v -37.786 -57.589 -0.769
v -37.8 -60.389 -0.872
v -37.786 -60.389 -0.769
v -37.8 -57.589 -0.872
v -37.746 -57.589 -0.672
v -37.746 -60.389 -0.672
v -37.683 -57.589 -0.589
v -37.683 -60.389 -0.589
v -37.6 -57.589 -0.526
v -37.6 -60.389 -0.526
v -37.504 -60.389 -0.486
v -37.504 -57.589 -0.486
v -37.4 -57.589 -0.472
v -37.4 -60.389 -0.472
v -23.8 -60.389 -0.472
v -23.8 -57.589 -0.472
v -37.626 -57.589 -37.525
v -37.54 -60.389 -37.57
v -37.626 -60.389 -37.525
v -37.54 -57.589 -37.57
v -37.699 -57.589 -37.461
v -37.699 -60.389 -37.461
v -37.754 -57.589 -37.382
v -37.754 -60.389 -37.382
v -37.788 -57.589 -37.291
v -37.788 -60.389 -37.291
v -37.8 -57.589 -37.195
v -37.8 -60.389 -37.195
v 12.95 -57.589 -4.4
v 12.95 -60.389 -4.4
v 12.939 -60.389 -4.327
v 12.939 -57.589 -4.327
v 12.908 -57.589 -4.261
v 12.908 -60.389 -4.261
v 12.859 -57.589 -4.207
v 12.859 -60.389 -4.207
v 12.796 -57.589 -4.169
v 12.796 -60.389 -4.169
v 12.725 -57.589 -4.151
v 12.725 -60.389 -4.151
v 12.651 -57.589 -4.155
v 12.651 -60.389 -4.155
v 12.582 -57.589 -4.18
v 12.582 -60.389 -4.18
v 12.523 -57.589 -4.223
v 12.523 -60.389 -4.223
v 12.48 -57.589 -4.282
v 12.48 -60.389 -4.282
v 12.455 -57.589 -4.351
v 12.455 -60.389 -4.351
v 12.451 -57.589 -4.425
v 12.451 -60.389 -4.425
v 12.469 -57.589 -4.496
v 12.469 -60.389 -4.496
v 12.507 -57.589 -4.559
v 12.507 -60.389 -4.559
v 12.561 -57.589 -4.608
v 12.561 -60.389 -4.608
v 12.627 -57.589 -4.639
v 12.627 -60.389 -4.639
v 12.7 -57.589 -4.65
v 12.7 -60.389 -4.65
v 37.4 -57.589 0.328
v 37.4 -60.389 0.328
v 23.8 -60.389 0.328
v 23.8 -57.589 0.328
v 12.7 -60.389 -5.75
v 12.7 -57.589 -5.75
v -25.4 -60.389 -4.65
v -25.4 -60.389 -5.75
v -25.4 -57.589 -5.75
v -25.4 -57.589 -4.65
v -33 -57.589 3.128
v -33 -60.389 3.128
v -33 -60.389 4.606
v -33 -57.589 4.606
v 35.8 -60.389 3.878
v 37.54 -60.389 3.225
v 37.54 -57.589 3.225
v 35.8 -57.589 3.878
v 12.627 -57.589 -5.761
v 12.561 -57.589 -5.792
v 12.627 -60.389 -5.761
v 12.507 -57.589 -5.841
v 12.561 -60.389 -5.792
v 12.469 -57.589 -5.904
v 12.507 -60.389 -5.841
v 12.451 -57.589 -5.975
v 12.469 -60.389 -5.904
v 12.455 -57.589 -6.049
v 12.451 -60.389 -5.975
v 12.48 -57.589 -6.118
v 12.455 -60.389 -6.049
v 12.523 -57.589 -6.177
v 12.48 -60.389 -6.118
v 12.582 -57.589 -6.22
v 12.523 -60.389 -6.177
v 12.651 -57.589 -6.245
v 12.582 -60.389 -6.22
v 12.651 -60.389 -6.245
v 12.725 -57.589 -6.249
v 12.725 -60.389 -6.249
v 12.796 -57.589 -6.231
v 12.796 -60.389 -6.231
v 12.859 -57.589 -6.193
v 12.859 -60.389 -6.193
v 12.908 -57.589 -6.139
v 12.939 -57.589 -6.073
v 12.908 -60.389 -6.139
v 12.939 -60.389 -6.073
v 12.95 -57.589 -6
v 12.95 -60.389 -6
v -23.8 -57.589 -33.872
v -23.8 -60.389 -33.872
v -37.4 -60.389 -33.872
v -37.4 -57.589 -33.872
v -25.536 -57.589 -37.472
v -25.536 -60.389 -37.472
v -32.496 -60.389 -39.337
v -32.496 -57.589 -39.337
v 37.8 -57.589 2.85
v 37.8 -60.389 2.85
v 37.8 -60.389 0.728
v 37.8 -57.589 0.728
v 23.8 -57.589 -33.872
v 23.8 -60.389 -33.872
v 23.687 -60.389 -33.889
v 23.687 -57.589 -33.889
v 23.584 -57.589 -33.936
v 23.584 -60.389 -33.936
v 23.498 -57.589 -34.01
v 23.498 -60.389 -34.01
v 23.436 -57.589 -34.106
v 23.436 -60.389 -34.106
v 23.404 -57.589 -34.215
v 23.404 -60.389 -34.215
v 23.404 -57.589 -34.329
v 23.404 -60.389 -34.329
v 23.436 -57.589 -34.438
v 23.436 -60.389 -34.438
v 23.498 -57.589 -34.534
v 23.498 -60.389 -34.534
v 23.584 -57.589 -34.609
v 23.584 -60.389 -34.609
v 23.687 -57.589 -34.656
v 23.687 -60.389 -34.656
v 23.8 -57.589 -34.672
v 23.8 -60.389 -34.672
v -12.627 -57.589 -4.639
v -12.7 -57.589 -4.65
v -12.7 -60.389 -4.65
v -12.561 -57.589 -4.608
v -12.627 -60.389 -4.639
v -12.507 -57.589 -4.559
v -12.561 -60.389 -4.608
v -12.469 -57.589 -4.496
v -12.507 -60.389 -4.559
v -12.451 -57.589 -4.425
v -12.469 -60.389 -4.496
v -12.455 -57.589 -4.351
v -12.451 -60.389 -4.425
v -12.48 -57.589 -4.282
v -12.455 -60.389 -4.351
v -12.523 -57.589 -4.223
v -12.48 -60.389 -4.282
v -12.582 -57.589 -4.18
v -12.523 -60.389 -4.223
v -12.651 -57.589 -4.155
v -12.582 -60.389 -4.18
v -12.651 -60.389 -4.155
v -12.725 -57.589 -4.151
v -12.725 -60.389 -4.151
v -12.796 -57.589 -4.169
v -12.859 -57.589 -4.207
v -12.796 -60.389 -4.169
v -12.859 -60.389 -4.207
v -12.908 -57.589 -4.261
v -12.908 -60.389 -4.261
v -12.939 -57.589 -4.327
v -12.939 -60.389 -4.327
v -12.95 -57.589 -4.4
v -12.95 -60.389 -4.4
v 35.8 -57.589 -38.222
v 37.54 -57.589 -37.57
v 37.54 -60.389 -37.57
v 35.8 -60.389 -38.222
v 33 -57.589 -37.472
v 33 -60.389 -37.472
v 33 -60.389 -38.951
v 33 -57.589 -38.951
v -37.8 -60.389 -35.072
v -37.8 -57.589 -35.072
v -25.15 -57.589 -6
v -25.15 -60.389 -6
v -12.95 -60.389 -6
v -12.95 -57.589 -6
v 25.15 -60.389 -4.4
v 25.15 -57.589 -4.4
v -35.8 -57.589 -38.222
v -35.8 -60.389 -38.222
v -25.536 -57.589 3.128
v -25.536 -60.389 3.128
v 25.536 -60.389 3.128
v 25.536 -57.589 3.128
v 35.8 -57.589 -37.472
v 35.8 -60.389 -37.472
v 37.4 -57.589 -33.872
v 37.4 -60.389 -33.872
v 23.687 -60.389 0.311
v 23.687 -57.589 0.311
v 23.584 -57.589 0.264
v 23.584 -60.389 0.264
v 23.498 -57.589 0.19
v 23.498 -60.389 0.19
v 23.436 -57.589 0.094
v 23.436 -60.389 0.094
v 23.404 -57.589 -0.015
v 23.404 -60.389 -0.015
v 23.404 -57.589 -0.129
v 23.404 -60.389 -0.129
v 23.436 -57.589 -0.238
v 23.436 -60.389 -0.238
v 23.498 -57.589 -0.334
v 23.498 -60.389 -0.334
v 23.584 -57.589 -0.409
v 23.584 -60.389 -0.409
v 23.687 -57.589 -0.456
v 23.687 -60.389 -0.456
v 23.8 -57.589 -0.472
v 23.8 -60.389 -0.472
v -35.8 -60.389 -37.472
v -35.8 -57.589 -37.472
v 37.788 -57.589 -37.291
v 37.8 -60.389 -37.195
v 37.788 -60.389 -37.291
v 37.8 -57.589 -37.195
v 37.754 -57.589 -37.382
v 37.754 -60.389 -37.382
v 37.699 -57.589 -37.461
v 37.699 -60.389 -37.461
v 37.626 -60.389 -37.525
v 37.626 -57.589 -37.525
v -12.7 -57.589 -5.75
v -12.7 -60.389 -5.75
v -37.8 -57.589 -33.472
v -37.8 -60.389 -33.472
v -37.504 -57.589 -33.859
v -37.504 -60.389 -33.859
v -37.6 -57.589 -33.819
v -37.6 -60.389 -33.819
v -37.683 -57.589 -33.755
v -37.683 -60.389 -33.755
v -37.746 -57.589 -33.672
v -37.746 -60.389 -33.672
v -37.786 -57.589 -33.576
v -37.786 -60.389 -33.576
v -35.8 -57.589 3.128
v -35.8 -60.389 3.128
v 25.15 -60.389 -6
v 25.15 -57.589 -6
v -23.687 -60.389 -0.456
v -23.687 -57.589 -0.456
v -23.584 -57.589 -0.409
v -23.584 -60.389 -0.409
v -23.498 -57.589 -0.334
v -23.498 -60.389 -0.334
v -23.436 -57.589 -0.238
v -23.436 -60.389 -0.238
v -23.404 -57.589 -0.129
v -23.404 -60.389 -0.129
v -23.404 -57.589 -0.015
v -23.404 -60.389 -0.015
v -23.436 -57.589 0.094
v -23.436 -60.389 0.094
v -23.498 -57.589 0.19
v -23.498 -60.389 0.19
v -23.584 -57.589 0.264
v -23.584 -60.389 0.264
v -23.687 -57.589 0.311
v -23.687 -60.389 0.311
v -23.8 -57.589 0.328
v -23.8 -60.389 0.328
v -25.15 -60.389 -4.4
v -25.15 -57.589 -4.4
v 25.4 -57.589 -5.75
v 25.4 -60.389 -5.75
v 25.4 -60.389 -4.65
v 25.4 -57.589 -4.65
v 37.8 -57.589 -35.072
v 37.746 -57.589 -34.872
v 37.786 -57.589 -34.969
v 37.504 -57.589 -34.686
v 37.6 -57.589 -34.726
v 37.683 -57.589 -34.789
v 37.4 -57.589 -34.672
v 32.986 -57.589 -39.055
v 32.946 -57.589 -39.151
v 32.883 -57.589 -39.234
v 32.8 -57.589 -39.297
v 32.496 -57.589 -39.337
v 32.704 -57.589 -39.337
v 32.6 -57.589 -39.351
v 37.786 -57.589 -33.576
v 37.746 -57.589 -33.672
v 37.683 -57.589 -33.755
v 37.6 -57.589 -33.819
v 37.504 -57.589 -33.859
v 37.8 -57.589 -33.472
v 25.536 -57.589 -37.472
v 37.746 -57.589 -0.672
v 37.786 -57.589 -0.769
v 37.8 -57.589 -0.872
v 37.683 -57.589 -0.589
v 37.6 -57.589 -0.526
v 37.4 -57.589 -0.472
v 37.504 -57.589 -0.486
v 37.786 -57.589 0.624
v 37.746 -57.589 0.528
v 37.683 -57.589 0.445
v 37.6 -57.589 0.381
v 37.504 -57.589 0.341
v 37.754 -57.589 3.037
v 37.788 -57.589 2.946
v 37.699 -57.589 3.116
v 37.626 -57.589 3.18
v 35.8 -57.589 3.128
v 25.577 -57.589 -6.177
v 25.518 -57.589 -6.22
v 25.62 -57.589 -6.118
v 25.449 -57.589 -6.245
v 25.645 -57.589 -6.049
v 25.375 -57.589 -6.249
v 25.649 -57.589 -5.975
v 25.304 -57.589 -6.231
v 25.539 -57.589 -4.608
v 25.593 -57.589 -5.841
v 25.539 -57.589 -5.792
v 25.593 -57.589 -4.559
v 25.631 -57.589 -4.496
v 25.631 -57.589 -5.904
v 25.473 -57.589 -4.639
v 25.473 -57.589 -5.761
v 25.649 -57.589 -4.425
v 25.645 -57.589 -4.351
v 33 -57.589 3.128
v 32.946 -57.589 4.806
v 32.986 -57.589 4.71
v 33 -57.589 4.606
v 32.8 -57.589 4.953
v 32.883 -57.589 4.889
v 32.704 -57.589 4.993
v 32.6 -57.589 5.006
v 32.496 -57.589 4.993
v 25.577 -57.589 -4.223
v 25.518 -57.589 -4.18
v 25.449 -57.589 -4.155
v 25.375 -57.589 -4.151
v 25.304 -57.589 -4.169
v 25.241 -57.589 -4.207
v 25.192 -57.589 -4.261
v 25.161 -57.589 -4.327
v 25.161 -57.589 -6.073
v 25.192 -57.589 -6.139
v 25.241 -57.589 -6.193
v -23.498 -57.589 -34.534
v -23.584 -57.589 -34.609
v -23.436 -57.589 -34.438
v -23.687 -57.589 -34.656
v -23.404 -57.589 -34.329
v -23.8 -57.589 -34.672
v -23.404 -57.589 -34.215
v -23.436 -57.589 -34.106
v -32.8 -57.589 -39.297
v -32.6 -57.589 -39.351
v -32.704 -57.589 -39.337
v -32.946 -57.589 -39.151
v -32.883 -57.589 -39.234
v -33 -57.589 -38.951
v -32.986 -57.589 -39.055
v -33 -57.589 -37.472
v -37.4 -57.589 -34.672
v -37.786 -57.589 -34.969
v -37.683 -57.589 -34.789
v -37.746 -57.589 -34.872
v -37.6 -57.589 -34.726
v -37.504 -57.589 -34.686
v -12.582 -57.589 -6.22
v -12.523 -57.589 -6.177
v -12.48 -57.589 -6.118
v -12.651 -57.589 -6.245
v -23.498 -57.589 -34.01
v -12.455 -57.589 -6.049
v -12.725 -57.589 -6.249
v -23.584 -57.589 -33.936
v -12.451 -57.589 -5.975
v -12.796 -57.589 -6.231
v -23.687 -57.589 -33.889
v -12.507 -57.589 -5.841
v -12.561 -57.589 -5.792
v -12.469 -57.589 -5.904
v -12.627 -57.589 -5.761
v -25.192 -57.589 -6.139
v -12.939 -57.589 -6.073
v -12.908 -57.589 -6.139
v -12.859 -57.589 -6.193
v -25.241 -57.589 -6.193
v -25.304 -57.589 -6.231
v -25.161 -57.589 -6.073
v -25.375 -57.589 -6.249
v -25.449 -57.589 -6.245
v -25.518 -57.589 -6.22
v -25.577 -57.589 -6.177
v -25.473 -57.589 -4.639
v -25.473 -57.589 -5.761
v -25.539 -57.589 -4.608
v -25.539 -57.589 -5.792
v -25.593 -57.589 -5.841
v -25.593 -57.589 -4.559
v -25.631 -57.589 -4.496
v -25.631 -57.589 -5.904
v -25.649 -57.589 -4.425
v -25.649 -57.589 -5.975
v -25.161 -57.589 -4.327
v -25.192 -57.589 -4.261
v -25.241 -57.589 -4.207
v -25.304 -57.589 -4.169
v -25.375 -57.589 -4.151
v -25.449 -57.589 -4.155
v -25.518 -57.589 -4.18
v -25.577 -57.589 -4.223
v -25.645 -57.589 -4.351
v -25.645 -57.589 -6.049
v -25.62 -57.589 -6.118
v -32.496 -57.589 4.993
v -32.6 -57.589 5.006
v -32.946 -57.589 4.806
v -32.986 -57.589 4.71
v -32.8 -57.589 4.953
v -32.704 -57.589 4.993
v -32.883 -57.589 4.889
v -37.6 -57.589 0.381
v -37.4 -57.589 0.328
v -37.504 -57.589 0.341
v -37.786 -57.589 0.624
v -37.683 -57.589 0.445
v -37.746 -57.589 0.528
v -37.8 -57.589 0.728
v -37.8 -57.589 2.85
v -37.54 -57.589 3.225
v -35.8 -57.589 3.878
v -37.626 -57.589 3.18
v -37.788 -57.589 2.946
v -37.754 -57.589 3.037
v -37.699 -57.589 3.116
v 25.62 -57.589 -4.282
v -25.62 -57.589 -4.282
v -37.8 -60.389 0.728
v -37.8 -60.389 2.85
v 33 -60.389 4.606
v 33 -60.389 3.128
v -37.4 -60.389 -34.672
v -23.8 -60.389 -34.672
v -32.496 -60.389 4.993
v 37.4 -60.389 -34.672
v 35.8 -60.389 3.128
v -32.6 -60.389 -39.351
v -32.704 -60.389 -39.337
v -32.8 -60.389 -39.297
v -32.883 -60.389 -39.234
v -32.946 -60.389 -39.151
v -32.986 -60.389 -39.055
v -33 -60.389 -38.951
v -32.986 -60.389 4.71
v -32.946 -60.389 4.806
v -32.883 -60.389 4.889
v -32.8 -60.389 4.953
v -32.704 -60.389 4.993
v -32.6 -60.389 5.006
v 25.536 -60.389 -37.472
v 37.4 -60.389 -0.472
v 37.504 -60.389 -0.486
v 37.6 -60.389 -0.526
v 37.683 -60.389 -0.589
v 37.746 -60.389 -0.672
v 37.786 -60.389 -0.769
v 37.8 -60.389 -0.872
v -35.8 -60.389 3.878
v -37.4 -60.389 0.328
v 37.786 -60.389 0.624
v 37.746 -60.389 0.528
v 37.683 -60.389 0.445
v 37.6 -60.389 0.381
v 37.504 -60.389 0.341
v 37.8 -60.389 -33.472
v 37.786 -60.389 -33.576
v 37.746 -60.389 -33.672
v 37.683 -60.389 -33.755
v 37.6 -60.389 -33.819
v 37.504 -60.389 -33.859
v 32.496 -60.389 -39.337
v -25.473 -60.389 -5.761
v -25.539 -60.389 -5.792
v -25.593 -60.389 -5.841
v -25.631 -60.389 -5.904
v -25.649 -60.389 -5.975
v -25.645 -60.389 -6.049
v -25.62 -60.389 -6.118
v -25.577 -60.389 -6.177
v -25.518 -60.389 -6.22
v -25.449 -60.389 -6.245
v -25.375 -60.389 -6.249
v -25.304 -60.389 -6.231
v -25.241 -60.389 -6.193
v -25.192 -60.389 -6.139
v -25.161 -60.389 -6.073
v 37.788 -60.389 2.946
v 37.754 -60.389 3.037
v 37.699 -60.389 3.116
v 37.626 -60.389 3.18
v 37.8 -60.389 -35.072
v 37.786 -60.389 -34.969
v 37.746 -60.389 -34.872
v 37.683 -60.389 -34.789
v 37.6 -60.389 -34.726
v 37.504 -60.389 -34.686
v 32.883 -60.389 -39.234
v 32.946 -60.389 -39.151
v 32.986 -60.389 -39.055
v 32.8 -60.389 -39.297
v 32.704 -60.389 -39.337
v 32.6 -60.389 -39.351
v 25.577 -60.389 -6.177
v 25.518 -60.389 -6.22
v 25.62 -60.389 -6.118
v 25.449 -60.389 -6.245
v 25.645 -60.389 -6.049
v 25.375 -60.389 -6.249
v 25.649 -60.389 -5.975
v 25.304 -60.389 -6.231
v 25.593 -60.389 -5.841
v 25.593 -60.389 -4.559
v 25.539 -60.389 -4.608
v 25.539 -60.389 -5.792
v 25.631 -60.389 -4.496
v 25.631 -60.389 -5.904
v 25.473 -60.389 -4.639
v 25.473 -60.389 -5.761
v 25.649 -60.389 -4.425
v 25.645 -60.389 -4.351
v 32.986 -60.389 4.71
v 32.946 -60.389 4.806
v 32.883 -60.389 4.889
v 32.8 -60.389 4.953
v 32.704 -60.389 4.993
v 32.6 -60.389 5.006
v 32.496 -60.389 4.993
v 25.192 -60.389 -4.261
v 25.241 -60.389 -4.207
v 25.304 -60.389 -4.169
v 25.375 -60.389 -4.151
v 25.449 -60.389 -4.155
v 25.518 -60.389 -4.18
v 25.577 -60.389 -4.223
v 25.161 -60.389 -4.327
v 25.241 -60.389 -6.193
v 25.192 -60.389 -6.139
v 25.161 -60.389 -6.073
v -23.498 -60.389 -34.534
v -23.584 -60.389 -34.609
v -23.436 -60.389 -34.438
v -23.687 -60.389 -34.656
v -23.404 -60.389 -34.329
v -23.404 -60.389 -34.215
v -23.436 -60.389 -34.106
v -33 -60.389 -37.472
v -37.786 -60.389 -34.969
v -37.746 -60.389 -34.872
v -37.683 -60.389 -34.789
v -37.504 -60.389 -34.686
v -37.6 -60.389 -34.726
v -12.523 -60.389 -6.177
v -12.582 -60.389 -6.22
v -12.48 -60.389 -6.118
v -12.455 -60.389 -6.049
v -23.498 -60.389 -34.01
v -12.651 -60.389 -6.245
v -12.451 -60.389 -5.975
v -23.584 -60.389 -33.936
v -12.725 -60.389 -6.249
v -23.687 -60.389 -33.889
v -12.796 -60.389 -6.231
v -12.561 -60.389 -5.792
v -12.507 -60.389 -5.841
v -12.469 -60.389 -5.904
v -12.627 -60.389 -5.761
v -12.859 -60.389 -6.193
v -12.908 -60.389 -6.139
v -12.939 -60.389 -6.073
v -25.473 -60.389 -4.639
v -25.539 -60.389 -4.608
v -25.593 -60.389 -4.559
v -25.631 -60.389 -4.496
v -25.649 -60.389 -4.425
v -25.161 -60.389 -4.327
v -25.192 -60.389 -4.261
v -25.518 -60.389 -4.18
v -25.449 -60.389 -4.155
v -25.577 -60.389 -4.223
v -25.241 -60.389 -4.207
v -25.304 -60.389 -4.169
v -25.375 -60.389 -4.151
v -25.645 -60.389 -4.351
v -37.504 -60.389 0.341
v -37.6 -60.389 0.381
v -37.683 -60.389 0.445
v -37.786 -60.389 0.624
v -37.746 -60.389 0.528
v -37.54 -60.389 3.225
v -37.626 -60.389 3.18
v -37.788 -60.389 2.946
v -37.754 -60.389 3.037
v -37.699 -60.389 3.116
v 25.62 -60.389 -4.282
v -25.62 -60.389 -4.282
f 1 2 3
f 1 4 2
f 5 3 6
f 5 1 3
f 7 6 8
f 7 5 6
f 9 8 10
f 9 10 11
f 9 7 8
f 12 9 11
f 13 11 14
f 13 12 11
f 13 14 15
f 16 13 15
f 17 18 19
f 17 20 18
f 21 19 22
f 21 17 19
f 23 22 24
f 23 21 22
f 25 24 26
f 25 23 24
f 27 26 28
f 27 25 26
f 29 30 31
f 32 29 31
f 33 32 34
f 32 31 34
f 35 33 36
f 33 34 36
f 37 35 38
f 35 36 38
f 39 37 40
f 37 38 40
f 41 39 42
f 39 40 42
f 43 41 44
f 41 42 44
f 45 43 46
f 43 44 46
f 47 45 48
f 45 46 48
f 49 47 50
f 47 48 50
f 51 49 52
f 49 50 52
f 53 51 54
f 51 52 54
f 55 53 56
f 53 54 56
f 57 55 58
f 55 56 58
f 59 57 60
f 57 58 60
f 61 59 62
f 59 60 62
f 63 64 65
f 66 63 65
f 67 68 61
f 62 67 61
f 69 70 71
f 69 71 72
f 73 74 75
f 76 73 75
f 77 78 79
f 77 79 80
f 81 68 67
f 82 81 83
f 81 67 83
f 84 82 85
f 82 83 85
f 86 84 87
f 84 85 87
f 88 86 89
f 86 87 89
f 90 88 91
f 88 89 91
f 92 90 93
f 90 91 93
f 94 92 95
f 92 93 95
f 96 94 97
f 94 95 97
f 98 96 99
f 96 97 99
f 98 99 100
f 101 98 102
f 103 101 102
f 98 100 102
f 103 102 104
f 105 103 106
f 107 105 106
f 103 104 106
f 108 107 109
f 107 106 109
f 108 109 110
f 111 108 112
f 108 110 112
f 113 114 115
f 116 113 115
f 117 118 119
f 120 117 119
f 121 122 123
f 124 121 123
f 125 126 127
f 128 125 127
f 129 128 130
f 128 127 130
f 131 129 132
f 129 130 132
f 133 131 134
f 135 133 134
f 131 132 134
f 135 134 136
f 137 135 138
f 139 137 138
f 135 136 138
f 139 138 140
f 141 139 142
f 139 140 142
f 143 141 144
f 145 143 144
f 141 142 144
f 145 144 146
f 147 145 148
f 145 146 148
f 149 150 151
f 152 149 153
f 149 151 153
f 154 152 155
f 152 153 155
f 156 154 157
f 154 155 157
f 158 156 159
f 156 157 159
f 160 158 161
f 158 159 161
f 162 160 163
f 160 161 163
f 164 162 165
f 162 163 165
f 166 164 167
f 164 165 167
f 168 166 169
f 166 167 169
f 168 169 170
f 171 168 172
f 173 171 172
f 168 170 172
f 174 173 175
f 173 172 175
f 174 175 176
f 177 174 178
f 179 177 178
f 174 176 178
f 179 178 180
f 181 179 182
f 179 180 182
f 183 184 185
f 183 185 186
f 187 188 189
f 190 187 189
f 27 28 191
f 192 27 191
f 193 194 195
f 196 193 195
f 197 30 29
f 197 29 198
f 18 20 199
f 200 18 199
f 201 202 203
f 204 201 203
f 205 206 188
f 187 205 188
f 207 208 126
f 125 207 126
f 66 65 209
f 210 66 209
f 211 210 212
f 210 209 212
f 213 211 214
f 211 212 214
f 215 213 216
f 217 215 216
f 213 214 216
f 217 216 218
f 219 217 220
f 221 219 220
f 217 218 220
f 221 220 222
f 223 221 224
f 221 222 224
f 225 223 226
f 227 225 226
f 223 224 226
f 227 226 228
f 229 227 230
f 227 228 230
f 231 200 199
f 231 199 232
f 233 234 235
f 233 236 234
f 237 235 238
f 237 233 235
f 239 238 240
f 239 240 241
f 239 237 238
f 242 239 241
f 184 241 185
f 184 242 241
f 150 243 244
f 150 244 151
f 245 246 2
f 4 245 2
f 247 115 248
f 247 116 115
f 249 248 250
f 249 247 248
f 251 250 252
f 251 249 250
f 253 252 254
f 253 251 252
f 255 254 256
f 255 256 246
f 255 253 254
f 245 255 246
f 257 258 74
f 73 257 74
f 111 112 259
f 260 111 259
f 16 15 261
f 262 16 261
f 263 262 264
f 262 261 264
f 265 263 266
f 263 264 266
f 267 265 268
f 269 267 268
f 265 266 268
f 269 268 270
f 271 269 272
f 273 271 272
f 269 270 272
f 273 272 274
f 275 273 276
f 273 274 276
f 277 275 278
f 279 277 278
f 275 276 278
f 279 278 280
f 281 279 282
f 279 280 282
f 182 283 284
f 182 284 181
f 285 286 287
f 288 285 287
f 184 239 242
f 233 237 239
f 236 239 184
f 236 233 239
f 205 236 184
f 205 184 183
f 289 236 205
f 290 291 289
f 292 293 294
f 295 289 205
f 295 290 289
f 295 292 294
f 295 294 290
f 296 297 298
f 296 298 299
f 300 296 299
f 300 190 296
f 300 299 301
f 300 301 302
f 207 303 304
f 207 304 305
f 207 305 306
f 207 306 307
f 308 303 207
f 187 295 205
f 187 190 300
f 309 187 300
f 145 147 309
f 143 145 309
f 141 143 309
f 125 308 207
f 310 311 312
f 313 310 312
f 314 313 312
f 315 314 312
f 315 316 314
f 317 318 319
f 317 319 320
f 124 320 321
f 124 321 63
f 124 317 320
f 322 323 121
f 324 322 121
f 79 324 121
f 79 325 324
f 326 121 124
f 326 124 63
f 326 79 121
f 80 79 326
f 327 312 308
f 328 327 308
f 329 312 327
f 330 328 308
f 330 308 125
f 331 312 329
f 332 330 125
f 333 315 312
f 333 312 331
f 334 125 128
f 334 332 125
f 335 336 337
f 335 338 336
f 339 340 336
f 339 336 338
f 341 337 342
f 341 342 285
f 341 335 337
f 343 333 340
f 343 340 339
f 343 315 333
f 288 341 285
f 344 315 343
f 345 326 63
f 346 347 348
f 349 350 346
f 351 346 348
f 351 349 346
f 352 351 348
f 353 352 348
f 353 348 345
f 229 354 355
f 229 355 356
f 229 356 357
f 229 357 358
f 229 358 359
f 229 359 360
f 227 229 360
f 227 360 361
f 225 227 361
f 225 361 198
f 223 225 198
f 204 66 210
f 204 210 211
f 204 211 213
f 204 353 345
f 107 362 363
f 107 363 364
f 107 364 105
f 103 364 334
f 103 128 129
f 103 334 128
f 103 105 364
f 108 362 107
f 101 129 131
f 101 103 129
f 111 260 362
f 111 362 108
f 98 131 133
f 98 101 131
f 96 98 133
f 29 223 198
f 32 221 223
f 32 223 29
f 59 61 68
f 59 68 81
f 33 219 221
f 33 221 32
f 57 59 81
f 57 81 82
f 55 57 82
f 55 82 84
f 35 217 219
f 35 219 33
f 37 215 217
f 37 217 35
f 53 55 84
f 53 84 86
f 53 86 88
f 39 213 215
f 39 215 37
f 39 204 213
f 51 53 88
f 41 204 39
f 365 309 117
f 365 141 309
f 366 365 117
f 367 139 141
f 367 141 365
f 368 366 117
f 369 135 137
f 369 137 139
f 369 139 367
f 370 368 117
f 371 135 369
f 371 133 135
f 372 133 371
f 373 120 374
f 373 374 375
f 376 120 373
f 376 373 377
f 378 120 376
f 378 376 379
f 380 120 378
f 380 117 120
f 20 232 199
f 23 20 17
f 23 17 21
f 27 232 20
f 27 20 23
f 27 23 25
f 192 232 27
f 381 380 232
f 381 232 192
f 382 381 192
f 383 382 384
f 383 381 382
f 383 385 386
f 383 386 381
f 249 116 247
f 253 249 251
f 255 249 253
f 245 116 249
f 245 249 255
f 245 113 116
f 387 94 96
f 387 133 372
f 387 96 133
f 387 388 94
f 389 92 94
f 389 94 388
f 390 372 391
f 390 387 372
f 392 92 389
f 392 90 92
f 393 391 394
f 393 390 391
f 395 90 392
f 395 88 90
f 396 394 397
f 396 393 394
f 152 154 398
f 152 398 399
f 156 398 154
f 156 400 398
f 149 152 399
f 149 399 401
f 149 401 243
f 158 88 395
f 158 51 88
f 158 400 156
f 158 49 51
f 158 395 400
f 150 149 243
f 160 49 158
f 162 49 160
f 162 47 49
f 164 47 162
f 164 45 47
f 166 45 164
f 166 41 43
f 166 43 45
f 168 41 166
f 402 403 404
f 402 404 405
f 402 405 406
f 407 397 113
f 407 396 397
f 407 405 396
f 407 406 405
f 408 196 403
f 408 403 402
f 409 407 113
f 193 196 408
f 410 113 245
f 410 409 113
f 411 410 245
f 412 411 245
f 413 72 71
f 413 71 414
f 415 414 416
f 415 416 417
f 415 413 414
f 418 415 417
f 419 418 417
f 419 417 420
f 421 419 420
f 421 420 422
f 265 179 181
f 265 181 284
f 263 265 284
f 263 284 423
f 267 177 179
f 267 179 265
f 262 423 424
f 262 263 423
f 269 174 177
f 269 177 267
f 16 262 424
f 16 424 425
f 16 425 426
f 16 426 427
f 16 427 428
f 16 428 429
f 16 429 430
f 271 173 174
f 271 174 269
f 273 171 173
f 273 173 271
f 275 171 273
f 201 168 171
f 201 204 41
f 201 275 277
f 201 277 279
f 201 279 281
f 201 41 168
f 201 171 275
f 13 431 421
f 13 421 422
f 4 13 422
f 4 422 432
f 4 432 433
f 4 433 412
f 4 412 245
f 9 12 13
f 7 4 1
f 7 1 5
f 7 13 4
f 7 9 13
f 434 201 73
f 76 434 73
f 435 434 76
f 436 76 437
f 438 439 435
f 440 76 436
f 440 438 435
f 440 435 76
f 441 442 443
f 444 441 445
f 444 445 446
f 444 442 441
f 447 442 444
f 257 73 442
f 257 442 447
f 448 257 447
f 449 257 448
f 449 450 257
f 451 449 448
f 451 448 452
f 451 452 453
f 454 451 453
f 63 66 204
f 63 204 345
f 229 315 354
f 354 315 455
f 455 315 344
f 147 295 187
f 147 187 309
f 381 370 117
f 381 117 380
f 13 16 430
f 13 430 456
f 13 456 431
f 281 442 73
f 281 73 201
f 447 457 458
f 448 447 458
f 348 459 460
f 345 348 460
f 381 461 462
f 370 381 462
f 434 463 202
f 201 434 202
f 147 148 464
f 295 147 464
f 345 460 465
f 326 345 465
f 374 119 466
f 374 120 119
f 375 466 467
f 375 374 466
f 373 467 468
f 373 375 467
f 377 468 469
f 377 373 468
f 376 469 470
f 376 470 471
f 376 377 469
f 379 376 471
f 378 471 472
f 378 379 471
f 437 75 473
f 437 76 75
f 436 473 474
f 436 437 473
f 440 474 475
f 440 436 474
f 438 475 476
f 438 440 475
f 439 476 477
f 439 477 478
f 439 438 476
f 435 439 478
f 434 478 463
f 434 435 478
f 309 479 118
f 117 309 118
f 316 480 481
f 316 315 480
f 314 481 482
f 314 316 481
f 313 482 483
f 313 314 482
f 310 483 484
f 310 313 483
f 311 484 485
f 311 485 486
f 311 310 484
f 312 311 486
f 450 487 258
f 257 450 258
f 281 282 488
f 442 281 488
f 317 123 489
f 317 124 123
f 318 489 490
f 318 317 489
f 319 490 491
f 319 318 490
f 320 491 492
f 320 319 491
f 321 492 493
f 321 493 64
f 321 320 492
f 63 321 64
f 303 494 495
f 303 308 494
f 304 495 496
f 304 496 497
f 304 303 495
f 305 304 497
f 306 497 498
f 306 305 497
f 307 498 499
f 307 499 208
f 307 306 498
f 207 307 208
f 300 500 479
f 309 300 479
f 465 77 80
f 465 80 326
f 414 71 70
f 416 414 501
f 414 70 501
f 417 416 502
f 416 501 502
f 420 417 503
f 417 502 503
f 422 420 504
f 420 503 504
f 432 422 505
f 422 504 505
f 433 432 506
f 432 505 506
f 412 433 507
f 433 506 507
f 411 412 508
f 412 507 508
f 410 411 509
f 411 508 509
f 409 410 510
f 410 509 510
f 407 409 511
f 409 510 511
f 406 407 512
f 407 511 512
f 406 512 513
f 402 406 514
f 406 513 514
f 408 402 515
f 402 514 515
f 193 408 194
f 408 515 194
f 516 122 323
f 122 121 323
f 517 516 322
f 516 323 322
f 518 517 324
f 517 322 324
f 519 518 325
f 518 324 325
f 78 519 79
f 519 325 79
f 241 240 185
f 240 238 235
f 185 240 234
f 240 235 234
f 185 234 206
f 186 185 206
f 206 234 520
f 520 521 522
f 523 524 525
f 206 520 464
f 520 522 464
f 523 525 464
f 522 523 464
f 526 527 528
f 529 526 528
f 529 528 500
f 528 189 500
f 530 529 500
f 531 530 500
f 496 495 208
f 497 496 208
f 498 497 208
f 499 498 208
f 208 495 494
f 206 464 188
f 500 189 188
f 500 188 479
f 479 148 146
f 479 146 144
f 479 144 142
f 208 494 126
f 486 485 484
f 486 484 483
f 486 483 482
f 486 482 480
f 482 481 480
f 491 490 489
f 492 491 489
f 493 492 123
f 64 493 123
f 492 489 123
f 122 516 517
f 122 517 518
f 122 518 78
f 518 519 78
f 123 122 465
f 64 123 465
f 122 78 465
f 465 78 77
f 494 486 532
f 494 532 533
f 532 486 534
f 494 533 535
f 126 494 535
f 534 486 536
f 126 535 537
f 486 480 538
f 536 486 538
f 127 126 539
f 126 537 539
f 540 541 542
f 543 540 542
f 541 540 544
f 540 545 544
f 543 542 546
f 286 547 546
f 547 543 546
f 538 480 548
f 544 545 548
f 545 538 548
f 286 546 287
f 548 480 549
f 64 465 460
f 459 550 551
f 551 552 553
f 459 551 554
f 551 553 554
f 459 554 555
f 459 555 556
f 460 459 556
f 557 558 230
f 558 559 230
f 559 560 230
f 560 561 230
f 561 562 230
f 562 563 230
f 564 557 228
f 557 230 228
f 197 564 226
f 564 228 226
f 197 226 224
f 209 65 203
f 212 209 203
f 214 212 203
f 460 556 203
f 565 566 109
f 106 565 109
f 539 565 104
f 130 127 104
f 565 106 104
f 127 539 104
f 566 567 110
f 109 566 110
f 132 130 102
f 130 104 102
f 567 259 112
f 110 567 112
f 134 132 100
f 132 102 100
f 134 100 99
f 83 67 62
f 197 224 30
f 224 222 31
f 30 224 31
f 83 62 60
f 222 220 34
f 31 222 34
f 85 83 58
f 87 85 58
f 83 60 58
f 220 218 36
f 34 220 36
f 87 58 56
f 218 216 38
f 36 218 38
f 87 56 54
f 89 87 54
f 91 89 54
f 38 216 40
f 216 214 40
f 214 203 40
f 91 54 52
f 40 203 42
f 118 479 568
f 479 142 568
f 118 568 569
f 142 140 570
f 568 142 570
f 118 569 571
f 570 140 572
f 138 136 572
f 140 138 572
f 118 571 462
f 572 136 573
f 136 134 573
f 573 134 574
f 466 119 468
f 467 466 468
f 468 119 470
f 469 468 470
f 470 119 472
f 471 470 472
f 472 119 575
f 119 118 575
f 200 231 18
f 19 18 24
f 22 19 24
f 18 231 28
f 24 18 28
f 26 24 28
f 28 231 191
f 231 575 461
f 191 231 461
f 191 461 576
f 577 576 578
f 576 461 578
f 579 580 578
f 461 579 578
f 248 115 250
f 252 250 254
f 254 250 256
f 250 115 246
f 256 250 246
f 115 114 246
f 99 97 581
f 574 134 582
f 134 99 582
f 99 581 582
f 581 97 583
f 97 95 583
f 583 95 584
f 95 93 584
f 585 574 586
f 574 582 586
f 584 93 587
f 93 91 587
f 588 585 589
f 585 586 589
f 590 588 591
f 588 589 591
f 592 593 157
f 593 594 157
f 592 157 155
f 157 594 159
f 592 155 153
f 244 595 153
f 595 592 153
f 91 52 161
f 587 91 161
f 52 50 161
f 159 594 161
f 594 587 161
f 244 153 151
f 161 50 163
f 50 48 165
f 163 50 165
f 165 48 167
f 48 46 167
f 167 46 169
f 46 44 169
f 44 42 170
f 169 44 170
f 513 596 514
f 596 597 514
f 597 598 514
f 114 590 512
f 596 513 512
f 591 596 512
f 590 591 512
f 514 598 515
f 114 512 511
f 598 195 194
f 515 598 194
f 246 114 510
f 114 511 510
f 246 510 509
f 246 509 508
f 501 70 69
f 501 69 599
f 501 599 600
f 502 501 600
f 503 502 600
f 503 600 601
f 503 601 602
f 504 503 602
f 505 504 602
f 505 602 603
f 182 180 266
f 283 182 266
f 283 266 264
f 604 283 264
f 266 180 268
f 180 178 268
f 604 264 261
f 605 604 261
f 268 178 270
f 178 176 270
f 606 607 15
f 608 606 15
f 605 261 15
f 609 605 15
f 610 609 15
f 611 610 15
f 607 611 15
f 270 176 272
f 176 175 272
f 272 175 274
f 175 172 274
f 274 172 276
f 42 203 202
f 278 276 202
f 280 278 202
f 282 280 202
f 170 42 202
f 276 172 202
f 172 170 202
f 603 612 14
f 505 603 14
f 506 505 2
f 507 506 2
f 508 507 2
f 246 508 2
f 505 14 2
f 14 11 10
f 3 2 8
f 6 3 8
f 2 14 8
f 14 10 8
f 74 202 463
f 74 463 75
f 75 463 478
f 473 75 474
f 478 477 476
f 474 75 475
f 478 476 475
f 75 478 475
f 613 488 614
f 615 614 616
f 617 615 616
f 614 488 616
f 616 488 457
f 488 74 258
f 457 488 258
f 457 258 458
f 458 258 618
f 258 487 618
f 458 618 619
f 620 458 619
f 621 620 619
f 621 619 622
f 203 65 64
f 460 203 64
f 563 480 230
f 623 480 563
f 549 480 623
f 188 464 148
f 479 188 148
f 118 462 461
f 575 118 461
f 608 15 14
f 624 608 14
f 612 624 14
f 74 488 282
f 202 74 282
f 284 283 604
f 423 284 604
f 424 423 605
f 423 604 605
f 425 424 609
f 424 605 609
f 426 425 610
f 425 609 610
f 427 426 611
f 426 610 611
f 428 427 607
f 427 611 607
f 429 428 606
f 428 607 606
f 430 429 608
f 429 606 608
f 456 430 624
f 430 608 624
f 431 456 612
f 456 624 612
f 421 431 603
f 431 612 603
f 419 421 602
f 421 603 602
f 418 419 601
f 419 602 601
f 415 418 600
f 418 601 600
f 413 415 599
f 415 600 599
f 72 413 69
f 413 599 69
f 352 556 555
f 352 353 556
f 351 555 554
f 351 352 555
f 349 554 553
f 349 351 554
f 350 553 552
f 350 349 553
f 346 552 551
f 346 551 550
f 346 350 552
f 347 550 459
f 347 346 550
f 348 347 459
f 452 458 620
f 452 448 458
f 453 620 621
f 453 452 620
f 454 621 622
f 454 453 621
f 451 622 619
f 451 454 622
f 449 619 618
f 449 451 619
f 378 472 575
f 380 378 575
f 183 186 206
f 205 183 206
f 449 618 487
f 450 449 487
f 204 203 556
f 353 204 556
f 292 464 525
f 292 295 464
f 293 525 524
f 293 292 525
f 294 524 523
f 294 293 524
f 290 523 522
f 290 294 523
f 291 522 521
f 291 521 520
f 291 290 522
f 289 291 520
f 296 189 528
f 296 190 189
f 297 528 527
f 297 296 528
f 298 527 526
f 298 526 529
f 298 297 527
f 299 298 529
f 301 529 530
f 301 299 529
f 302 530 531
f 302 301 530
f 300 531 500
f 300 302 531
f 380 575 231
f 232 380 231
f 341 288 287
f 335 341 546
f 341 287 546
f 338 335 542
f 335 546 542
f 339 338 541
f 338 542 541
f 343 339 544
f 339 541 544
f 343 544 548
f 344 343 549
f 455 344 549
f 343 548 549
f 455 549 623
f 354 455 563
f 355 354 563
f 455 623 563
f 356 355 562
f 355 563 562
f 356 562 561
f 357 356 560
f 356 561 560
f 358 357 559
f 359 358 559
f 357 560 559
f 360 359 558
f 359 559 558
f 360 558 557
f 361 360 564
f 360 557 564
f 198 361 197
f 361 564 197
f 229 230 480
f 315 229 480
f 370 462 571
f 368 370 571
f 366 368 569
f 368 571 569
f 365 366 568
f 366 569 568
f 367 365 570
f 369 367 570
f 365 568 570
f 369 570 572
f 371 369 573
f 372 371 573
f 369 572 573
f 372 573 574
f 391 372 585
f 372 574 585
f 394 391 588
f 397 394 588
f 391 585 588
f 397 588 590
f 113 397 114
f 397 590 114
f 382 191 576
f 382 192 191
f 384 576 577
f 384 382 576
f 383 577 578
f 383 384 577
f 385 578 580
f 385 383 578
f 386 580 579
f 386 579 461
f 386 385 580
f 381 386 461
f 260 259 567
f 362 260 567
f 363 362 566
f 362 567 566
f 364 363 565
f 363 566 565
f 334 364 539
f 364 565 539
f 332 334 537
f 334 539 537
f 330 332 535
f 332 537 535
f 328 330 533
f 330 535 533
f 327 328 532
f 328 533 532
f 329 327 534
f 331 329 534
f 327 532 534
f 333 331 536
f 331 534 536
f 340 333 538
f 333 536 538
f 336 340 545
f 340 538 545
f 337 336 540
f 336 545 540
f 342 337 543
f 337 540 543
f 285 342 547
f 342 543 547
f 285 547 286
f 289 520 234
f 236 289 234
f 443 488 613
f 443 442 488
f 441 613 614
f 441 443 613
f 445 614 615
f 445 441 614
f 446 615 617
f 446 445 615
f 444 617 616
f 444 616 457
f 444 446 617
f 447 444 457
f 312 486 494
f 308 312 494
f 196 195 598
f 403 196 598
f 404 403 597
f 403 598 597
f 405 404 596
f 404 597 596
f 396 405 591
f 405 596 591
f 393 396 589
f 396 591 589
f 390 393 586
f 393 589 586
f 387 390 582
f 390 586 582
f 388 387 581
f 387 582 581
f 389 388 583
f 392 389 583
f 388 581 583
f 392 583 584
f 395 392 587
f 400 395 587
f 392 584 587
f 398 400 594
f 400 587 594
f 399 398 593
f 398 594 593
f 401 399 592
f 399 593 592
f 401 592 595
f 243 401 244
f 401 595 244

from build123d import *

# Parameters (mm, degrees)
PAD009_DEPTH    = 2.8
FILLET004_R     = 0.4
SKETCH025_W     = 12.7
SKETCH025_H     = 1.6
POCKET014_DEPTH = 2.801
SKETCH026_R     = 0.25
POCKET015_DEPTH = 2.801


with BuildPart() as part:
    # Sketch009 (on Face6 of ShapeBinder008) → Pad009 (new body)
    with BuildSketch(Plane.XZ.offset(60.388718)):
        with BuildLine():
            Line((37.8, 3.127675), (37.8, 0.327675))
            Line((37.8, 0.327675), (23.8, 0.327675))
            ThreePointArc((23.8, 0.327675), (23.4, -0.072325), (23.8, -0.472325))
            Line((23.8, -0.472325), (37.8, -0.472325))
            Line((37.8, -0.472325), (37.8, -33.872325))
            Line((37.8, -33.872325), (23.8, -33.872325))
            ThreePointArc((23.8, -33.872325), (23.4, -34.272325), (23.8, -34.672325))
            Line((23.8, -34.672325), (37.8, -34.672325))
            Line((37.8, -34.672325), (37.8, -37.472325))
            Line((37.8, -37.472325), (35.8, -38.222325))
            Line((35.8, -38.222325), (35.8, -37.472325))
            Line((35.8, -37.472325), (33, -37.472325))
            Line((33, -37.472325), (33, -39.472325))
            Line((33, -39.472325), (25.535898, -37.472325))
            Line((25.535898, -37.472325), (-25.535898, -37.472325))
            Line((-25.535898, -37.472325), (-33, -39.472325))
            Line((-33, -39.472325), (-33, -37.472325))
            Line((-33, -37.472325), (-35.8, -37.472325))
            Line((-35.8, -38.222325), (-35.8, -37.472325))
            Line((-37.8, -37.472325), (-35.8, -38.222325))
            Line((-37.8, -37.472325), (-37.8, -34.672325))
            Line((-37.8, -34.672325), (-23.8, -34.672325))
            ThreePointArc((-23.8, -34.672325), (-23.4, -34.272325), (-23.8, -33.872325))
            Line((-23.8, -33.872325), (-37.8, -33.872325))
            Line((-37.8, -33.872325), (-37.8, -0.472325))
            Line((-37.8, -0.472325), (-23.8, -0.472325))
            ThreePointArc((-23.8, -0.472325), (-23.4, -0.072325), (-23.8, 0.327675))
            Line((-23.8, 0.327675), (-37.8, 0.327675))
            Line((-37.8, 0.327675), (-37.8, 3.127675))
            Line((-37.8, 3.127675), (-35.8, 3.877675))
            Line((-35.8, 3.877675), (-35.8, 3.127675))
            Line((-35.8, 3.127675), (-33, 3.127675))
            Line((-33, 3.127675), (-33, 5.127675))
            Line((-33, 5.127675), (-25.535898, 3.127675))
            Line((-25.535898, 3.127675), (25.535898, 3.127675))
            Line((25.535898, 3.127675), (33, 5.127675))
            Line((33, 5.127675), (33, 3.127675))
            Line((33, 3.127675), (35.8, 3.127675))
            Line((35.8, 3.877675), (35.8, 3.127675))
            Line((37.8, 3.127675), (35.8, 3.877675))
        make_face()
    extrude(amount=-PAD009_DEPTH)

    # Fillet004
    fillet004_edges = [part.edges().sort_by_distance(p)[0] for p in [
        (33, -58.988718, 5.127675),
        (37.8, -58.988718, 3.127675),
        (37.8, -58.988718, 0.327675),
        (37.8, -58.988718, -0.472325),
        (37.8, -58.988718, -33.872325),
        (37.8, -58.988718, -34.672325),
        (37.8, -58.988718, -37.472325),
        (33, -58.988718, -39.472325),
        (-37.8, -58.988718, -33.872325),
        (-37.8, -58.988718, -34.672325),
        (-37.8, -58.988718, -37.472325),
        (-33, -58.988718, -39.472325),
        (-33, -58.988718, 5.127675),
        (-37.8, -58.988718, 3.127675),
        (-37.8, -58.988718, 0.327675),
        (-37.8, -58.988718, -0.472325),
    ]]
    fillet(fillet004_edges, radius=FILLET004_R)

    # Sketch025 (on Face2 of Fillet004) → Pocket014 (cut, through all)
    with BuildSketch(Plane.XZ.offset(60.388718)):
        with Locations((-19.05, -5.2)):
            Rectangle(SKETCH025_W, SKETCH025_H)
        with Locations((19.05, -5.2)):
            Rectangle(SKETCH025_W, SKETCH025_H)
    extrude(amount=-POCKET014_DEPTH, mode=Mode.SUBTRACT)

    # Sketch026 (on Face2 of Pocket014) → Pocket015 (cut, through all)
    with BuildSketch(Plane.XZ.offset(60.388718)):
        with Locations((-25.4, -4.4)):
            Circle(SKETCH026_R)
        with Locations((-12.7, -4.4)):
            Circle(SKETCH026_R)
        with Locations((-12.7, -6)):
            Circle(SKETCH026_R)
        with Locations((-25.4, -6)):
            Circle(SKETCH026_R)
        with Locations((12.7, -4.4)):
            Circle(SKETCH026_R)
        with Locations((12.7, -6)):
            Circle(SKETCH026_R)
        with Locations((25.4, -4.4)):
            Circle(SKETCH026_R)
        with Locations((25.4, -6)):
            Circle(SKETCH026_R)
    extrude(amount=-POCKET015_DEPTH, mode=Mode.SUBTRACT)


solid = part.part
